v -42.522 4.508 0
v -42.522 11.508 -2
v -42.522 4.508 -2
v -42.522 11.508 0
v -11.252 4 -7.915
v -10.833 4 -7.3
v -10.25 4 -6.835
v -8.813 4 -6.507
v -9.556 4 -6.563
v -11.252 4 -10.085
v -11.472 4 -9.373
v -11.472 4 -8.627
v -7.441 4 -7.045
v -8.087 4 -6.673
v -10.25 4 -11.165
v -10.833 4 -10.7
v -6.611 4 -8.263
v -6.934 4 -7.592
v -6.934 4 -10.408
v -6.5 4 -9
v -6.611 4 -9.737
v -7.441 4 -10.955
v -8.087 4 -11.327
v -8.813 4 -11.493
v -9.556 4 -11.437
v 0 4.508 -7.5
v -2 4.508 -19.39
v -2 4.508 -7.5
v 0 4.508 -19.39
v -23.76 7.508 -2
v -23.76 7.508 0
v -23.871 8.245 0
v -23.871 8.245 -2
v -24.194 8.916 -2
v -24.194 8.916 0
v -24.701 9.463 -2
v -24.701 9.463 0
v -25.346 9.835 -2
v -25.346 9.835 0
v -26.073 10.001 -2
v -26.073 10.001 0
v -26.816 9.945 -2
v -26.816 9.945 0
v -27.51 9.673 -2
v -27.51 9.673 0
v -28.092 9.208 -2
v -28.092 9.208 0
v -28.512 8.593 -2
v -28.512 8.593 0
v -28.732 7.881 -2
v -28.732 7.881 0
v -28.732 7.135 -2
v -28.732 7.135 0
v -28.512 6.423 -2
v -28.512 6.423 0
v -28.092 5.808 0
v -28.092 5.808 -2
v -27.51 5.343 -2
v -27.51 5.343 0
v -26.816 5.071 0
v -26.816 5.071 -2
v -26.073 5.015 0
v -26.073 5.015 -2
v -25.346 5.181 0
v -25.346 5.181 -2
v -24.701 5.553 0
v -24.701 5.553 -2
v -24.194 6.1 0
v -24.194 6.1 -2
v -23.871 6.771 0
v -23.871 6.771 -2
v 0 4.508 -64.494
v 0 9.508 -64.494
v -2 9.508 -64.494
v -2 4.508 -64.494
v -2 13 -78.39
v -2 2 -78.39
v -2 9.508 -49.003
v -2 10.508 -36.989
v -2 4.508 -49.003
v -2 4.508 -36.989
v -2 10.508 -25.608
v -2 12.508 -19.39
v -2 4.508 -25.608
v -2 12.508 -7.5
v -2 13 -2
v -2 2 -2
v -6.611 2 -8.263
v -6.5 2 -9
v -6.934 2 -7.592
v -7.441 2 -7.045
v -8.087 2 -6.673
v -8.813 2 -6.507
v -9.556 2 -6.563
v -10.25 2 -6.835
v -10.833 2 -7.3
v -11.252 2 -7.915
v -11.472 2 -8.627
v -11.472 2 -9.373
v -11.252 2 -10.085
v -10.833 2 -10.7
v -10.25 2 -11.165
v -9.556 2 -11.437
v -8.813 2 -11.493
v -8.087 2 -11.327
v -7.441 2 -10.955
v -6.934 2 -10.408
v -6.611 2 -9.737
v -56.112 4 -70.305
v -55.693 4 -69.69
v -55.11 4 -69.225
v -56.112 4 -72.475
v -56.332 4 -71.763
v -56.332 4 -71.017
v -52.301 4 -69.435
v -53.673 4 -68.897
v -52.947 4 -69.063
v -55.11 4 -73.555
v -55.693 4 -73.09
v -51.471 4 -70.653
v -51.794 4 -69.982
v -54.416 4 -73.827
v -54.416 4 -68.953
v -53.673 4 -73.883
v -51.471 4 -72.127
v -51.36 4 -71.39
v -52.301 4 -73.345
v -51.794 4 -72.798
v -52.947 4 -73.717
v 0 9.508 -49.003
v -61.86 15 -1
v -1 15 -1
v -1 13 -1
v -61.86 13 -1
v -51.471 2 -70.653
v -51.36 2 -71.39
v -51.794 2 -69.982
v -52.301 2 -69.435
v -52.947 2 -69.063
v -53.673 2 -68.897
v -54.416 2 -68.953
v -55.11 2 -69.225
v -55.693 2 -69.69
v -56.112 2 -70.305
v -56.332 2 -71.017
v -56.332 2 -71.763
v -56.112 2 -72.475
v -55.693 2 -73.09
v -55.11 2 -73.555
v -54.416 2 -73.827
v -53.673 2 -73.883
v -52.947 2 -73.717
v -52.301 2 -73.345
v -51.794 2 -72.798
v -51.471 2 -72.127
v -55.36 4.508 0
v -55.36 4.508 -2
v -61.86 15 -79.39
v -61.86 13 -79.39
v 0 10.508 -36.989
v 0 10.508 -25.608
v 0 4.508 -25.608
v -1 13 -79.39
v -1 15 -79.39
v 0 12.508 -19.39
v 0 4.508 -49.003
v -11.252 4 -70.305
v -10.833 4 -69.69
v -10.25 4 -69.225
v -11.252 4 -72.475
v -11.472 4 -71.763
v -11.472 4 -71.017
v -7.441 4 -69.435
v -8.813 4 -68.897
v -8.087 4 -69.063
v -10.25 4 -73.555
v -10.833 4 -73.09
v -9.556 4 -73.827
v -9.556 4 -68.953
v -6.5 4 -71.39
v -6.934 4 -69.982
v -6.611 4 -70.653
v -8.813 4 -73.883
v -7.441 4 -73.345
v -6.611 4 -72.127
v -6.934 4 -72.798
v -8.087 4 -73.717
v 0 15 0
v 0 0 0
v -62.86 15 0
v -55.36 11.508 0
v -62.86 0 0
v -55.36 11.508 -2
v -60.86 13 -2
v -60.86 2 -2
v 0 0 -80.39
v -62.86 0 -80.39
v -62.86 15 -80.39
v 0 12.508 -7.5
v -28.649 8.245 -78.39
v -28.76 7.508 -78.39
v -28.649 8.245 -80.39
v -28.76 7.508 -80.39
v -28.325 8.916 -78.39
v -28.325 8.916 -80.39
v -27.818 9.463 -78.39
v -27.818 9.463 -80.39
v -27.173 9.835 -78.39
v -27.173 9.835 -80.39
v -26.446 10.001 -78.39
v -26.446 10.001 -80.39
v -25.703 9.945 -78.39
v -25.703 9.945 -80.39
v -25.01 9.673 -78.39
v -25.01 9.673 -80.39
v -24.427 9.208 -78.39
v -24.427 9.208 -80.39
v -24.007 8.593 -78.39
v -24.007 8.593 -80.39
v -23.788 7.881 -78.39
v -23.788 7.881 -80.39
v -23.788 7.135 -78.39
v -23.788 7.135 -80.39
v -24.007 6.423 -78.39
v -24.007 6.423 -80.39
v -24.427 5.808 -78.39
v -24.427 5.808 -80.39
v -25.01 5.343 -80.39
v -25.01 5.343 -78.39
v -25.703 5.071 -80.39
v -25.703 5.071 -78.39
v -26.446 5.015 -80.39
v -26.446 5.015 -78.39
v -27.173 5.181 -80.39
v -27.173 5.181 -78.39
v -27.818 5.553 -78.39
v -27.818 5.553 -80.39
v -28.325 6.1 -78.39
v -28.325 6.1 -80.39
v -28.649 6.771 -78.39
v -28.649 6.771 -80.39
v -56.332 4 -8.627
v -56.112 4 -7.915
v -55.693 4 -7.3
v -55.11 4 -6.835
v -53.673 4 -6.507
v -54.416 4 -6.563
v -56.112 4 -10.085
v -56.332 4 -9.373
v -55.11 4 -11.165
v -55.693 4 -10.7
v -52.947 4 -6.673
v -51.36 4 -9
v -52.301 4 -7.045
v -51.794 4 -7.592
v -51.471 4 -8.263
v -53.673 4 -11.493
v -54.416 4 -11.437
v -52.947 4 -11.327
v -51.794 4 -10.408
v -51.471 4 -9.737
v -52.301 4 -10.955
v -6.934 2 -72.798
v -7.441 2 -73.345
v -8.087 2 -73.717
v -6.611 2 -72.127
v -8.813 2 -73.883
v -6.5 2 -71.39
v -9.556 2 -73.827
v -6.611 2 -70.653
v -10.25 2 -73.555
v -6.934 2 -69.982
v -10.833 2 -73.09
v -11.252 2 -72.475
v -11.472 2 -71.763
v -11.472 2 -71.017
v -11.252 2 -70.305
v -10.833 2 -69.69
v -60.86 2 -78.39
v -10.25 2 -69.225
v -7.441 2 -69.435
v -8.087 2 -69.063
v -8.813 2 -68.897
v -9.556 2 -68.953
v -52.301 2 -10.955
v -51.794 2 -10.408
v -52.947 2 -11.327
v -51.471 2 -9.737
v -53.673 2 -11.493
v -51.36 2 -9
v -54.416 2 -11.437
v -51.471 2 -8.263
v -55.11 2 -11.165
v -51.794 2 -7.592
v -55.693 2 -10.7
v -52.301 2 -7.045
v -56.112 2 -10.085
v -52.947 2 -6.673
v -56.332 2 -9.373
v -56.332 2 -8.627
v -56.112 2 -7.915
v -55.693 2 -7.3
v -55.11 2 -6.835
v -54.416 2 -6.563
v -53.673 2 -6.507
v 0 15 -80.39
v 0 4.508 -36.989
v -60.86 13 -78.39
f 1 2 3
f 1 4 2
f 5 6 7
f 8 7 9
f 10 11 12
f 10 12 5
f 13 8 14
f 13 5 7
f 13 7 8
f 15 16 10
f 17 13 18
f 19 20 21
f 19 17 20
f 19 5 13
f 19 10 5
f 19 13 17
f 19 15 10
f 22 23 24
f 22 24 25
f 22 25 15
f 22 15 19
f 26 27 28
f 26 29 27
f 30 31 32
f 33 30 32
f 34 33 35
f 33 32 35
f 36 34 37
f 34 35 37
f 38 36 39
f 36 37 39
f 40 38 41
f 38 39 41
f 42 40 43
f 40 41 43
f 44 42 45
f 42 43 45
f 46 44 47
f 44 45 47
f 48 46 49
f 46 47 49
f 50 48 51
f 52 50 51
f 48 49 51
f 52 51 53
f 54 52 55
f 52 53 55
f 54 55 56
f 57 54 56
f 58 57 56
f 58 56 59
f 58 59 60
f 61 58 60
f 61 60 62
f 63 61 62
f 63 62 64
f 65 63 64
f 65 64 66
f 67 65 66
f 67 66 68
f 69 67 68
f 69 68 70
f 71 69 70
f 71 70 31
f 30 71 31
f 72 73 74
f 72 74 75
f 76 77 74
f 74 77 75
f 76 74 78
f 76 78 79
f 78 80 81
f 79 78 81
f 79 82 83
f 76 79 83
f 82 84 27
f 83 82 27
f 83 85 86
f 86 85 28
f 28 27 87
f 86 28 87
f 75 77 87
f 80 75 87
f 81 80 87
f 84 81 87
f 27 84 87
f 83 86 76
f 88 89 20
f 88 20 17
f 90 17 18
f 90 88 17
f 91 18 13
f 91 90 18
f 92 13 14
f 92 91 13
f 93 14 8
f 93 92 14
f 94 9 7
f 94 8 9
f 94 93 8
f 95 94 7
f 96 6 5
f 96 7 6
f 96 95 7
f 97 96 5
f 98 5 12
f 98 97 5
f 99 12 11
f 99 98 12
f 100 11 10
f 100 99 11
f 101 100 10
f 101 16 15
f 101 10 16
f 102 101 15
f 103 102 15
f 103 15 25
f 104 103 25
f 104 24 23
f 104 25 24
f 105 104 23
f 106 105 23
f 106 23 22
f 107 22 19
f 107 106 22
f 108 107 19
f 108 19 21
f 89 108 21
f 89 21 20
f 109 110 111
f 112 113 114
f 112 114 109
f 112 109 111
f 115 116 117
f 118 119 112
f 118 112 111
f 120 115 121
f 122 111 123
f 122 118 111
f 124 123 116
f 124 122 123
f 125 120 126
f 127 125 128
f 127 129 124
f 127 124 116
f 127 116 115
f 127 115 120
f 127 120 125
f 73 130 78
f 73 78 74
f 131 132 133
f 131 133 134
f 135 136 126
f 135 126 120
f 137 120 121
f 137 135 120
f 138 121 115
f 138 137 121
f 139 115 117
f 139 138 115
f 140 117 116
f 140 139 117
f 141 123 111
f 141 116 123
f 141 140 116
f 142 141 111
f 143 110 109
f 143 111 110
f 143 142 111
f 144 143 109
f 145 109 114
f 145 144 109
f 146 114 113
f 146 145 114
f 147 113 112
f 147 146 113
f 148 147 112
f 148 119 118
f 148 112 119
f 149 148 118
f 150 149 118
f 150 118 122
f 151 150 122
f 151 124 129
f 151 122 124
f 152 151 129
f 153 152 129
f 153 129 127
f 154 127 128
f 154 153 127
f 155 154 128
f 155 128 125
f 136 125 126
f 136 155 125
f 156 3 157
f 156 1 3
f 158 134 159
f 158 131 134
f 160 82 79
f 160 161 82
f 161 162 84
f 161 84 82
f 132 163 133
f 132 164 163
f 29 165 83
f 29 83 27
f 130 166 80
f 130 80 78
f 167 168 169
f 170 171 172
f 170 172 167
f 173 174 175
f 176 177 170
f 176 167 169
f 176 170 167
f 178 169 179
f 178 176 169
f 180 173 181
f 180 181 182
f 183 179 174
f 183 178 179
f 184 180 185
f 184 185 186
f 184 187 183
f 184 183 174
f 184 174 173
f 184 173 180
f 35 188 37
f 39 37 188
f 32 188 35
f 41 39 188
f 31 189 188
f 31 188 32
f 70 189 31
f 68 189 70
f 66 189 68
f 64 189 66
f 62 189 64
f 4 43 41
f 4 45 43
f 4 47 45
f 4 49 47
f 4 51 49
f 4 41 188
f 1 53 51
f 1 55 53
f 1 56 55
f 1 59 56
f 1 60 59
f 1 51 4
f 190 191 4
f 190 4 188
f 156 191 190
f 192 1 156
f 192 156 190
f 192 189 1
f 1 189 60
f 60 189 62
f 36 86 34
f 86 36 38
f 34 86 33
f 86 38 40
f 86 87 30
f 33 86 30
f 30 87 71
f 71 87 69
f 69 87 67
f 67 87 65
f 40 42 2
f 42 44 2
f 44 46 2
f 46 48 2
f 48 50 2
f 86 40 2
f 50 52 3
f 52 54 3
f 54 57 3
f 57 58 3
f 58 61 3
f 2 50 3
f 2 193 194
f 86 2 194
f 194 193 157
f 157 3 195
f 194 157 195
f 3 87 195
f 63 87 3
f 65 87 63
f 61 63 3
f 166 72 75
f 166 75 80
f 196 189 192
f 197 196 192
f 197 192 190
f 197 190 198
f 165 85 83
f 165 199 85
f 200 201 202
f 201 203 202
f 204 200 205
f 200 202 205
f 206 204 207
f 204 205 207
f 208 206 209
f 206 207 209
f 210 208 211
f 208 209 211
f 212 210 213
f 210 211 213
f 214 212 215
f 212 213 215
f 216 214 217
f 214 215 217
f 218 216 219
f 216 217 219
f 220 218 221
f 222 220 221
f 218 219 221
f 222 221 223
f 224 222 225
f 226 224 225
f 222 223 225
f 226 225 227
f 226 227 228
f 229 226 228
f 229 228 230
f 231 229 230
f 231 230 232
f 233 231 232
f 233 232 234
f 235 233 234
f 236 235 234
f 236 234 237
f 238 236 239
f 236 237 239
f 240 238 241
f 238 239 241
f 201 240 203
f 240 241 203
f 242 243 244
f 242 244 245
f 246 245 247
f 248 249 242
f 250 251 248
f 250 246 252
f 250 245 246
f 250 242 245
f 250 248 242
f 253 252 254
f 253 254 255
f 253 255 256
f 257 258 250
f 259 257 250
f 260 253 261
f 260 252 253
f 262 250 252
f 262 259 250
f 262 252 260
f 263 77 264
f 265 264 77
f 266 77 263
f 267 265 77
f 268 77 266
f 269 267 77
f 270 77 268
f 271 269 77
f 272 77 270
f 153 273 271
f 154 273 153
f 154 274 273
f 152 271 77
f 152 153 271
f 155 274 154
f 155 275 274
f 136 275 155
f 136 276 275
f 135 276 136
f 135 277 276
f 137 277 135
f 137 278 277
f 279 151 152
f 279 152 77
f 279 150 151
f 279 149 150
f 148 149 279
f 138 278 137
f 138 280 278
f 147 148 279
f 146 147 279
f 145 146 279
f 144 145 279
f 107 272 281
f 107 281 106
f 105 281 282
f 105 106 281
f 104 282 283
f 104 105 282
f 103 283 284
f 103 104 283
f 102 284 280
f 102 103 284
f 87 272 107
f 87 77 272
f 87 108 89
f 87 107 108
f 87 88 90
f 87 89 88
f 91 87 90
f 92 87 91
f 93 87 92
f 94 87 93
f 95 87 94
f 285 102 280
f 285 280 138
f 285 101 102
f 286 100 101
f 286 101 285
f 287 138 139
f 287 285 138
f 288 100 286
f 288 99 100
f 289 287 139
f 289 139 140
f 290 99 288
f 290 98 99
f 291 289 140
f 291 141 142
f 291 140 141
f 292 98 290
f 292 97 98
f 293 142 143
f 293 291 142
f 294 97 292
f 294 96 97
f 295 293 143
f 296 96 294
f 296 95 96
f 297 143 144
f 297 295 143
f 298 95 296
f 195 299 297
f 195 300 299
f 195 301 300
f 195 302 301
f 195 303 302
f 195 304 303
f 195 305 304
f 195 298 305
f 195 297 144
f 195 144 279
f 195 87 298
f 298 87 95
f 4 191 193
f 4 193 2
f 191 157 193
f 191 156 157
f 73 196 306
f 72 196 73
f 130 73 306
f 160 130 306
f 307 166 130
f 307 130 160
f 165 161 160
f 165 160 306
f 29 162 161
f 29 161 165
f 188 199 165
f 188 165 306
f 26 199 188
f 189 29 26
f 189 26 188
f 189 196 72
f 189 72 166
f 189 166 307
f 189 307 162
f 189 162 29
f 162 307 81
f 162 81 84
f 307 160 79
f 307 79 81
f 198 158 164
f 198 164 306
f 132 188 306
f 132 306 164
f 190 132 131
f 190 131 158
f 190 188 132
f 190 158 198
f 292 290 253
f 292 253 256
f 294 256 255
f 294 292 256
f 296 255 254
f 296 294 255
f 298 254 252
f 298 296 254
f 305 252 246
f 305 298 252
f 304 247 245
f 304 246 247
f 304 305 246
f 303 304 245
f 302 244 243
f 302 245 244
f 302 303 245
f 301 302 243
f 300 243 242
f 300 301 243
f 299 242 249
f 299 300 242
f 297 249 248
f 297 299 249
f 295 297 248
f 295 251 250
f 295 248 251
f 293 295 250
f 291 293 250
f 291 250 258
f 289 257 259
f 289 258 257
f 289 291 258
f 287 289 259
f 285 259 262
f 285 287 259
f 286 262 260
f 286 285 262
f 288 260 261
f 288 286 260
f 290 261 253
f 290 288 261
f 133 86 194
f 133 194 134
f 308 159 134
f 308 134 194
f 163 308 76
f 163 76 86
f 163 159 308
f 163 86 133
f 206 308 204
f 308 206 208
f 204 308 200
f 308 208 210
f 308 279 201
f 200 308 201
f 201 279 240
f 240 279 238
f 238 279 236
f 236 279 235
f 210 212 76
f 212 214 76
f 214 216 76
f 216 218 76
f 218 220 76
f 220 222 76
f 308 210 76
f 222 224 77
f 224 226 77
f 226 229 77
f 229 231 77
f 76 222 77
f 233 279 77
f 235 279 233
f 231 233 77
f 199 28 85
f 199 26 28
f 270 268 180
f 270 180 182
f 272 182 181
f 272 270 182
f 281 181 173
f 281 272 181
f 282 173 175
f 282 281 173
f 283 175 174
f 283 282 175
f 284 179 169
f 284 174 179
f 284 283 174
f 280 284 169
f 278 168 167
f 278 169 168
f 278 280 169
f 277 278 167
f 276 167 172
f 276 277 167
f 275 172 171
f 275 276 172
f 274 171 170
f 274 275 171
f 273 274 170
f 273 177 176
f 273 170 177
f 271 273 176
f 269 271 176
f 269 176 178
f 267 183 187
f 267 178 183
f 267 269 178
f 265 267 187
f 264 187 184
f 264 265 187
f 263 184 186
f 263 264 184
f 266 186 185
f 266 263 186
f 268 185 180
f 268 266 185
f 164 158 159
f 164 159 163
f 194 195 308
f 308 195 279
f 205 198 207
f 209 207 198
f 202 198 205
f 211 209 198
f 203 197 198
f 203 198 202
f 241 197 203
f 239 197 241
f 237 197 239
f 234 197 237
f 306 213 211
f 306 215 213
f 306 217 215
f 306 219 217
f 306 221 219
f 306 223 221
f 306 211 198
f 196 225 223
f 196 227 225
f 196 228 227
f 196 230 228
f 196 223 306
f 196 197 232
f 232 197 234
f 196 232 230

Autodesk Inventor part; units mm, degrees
ref_plane "YZ Plane" through (0, 0, 0) normal (1, 0, 0) x (0, 1, 0)
ref_plane "XZ Plane" through (0, 0, 0) normal (0, 1, 0) x (-1, 0, 0)
ref_plane "XY Plane" through (0, 0, 0) normal (0, 0, 1) x (1, 0, 0)
sketch "Sketch1" plane through (0, 0, 0) normal (0, 1, 0) x (-1, 0, 0)
  line L0 (0, 0) -> (62.86, 0)
  line L1 (62.86, 0) -> (62.86, -80.39)
  line L2 (62.86, -80.39) -> (0, -80.39)
  line L3 (0, -80.39) -> (0, 0)
  line L4 (2, -2) -> (60.86, -2)
  line L5 (60.86, -2) -> (60.86, -78.39)
  line L6 (60.86, -78.39) -> (2, -78.39)
  line L7 (2, -78.39) -> (2, -2)
  dimension "d0" = 62.86
  dimension "d1" = 80.39
  dimension "d2" = 58.86
  dimension "d3" = 76.39
  dimension "d4" = 2
  dimension "d5" = 2
extrude "Extrusion1" add sketch "Sketch1" along normal blind 15 contours L0 L1 L2 L3 | L4 L5 L6 L7
shell "Shell1" thickness 2 removed faces 1 at (-20.9533, 15, -26.7967)
sketch "Sketch2" plane through (-60.86, 2, -2) normal (0, 1, 0) x (1, 0, 0)
  point P0 (60.86, -2)
sketch "Sketch3" plane through (0, 15, 0) normal (0, 1, 0) x (1, 0, 0)
  line L0 (-60.86, 2) -> (-60.86, 78.39) projected
  line L1 (-60.86, 78.39) -> (-2, 78.39) projected
  line L2 (-2, 78.39) -> (-2, 2) projected
  line L3 (-2, 2) -> (-60.86, 2) projected
  line L4 (-62.86, 0) -> (0, 0) projected
  line L5 (0, 0) -> (0, 80.39) projected
  line L6 (0, 80.39) -> (-62.86, 80.39) projected
  line L7 (-62.86, 80.39) -> (-62.86, 0) projected
  line L8 (-61.86, 79.39) -> (-1, 79.39)
  line L9 (-1, 79.39) -> (-1, 1)
  line L10 (-1, 1) -> (-61.86, 1)
  line L11 (-61.86, 1) -> (-61.86, 79.39)
  dimension "d9" = 1
  dimension "d10" = 1
  dimension "d11" = 1
  dimension "d12" = 1
extrude "Extrusion2" cut sketch "Sketch3" against normal blind 2 contours L8 L9 L10 L11
sketch "Sketch4" plane through (-60.86, 2, -2) normal (0, 1, 0) x (1, 0, 0)
  circle A0 centre (7, 69.39) radius 2.5
  circle A1 centre (51.86, 69.39) radius 2.5
  circle A2 centre (7, 7) radius 2.5
  circle A3 centre (51.86, 7) radius 2.5
  line L0 (60.86, 78.39) -> (-2, 78.39) projected
  line L1 (-2, 78.39) -> (-2, -2) projected
  line L2 (60.86, -2) -> (60.86, 78.39) projected
  line L3 (-2, -2) -> (60.86, -2) projected
  dimension "d15" = 9
  dimension "d16" = 9
  dimension "d17" = 9
  dimension "d18" = 9
  dimension "d19" = 9
  dimension "d20" = 9
  dimension "d21" = 9
  dimension "d22" = 9
  dimension "d23" = 5
  dimension "d24" = 5
  dimension "d25" = 5
  dimension "d26" = 5
extrude "Extrusion3" add sketch "Sketch4" along normal blind 2 contours A0 | A1 | A2 | A3
sketch "Sketch5" plane through (0, 0, 0) normal (1, 0, 0) x (0, 0, -1)
  line L0 (11.5, 4) -> (6.5, 4) projected
  line L1 (73.89, 4) -> (68.89, 4) projected
  line L2 (68.89, 2) -> (68.89, 4) projected
  line L3 (73.89, 2) -> (73.89, 4) projected
  line L4 (78.39, 2) -> (2, 2) projected
  line L5 (78.39, 2) -> (78.39, 13) projected
  line L6 (80.39, 0) -> (0, 0) projected
  line L7 (80.39, 0) -> (80.39, 15) projected
  line L8 (0, 15) -> (80.39, 15) projected
  line L9 (0, 0) -> (0, 15) projected
  line L10 (11.5, 2) -> (11.5, 4) projected
  line L11 (2, 2) -> (2, 13) projected
  line L12 (6.5, 2) -> (6.5, 4) projected
  line L13 (79.39, 13) -> (1, 13) projected
  line L14 (7.5, 12.508) -> (19.3903, 12.508)
  line L15 (19.3903, 12.508) -> (19.3903, 4.508)
  line L16 (19.3903, 4.508) -> (7.5, 4.508)
  line L17 (7.5, 4.508) -> (7.5, 12.508)
  line L18 (25.6078, 10.508) -> (36.9891, 10.508)
  line L19 (36.9891, 10.508) -> (36.9891, 4.508)
  line L20 (36.9891, 4.508) -> (25.6078, 4.508)
  line L21 (25.6078, 4.508) -> (25.6078, 10.508)
  line L22 (49.0027, 9.508) -> (64.4938, 9.508)
  line L23 (64.4938, 9.508) -> (64.4938, 4.508)
  line L24 (64.4938, 4.508) -> (49.0027, 4.508)
  line L25 (49.0027, 4.508) -> (49.0027, 9.508)
  dimension "d29" = 0.508
  dimension "d30" = 8
  dimension "d31" = 6
  dimension "d32" = 5
extrude "Extrusion4" cut sketch "Sketch5" against normal blind 2 contours L14 L15 L16 L17 | L18 L19 L20 L21 | L22 L23 L24 L25
sketch "Sketch6" plane through (-62.86, 0, 0) normal (0, 0, 1) x (1, 0, 0)
  line L0 (60.86, 2) -> (2, 2) projected
  line L1 (11.5, 4) -> (6.5, 4) projected
  line L2 (11.5, 2) -> (11.5, 4) projected
  line L3 (6.5, 2) -> (6.5, 4) projected
  line L4 (60.86, 2) -> (60.86, 13) projected
  line L5 (56.36, 4) -> (51.36, 4) projected
  line L6 (51.36, 2) -> (51.36, 4) projected
  line L7 (56.36, 2) -> (56.36, 4) projected
  line L8 (2, 2) -> (2, 13) projected
  line L9 (61.86, 13) -> (1, 13) projected
  line L10 (7.5, 11.508) -> (20.3381, 11.508)
  line L11 (20.3381, 11.508) -> (20.3381, 4.508)
  line L12 (20.3381, 4.508) -> (7.5, 4.508)
  line L13 (7.5, 4.508) -> (7.5, 11.508)
  circle A0 centre (36.6004, 7.508) radius 2.5
  point P0 (62.86, 0)
  dimension "d35" = 0.508
  dimension "d36" = 7
  dimension "d37" = 5
  dimension "d38" = 5.508
extrude "Extrusion5" cut sketch "Sketch6" against normal blind 2 contours L10 L11 L12 L13 | A0
sketch "Sketch7" plane through (0, 0, -80.39) normal (0, 0, -1) x (-1, 0, 0)
  circle A0 centre (26.2596, 7.508) radius 2.5 projected
  point P0 (0, 0)
extrude "Extrusion6" cut sketch "Sketch7" against normal blind 2
properties part number "pcbProtectiveCase"
